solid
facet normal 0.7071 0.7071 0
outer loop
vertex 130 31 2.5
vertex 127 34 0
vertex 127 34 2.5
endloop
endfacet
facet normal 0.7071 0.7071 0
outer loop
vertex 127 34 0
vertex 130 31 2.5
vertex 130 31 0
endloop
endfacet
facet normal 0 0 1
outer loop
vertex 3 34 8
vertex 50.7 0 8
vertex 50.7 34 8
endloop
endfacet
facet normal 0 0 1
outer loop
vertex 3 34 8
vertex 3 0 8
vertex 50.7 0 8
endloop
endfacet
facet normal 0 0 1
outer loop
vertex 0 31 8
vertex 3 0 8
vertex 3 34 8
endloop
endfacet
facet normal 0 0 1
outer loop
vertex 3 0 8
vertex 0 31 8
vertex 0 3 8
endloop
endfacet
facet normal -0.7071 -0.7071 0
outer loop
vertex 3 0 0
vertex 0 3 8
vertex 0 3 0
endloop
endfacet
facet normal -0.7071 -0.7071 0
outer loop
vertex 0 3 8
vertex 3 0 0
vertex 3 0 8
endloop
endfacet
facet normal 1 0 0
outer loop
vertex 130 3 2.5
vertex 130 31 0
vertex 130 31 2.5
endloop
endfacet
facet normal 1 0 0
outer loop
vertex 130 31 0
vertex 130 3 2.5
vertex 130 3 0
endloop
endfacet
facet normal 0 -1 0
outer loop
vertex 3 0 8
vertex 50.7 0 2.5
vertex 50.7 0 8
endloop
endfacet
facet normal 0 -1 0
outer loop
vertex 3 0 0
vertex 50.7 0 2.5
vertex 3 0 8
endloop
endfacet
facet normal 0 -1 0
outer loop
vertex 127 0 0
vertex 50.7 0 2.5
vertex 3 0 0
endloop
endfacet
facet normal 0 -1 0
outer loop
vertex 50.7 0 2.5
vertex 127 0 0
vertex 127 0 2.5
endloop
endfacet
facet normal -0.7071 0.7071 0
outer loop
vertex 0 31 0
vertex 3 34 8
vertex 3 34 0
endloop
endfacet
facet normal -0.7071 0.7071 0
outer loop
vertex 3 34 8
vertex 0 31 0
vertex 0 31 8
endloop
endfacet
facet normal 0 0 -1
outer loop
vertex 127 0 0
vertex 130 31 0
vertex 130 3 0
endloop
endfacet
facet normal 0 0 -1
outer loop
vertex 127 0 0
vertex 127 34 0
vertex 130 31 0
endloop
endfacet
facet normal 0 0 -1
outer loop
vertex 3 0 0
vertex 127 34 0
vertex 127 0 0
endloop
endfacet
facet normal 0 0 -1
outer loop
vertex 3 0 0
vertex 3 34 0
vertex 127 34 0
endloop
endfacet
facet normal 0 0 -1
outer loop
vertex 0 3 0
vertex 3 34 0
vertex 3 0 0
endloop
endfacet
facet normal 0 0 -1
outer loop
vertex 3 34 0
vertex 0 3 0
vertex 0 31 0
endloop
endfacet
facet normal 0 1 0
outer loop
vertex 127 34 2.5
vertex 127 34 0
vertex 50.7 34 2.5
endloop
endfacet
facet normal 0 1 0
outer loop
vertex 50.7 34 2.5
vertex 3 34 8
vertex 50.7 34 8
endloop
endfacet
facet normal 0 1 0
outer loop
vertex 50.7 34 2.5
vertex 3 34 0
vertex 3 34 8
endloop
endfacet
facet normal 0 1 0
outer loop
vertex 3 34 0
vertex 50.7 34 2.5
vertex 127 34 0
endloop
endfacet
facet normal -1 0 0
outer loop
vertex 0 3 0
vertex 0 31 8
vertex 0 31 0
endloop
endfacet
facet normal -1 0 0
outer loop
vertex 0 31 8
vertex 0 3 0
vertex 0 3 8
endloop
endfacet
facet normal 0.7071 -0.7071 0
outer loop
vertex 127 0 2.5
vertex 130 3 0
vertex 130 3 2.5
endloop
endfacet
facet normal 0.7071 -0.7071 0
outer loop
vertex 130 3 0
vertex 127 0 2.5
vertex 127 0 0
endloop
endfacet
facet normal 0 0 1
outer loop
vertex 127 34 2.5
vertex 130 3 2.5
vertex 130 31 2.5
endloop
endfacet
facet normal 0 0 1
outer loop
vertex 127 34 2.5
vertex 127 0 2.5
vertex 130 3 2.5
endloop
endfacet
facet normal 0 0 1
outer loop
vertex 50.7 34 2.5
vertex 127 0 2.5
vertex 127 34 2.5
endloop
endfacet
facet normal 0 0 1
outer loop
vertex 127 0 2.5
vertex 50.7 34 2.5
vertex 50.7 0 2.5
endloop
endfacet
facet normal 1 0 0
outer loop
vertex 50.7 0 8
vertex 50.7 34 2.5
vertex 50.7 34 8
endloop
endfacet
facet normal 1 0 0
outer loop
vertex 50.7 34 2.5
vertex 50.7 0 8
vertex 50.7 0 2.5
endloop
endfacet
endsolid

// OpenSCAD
$fn = 32;

// ----------------------------------------------------------------------
// Stepped bar: endstep, 130 x 34 x 8/2.5 mm
// ----------------------------------------------------------------------

// --- parameters (mm) ---
bar_l = 130;              // bar length, X
bar_w = 34;               // bar width, Y
plate_t = 8;              // thickness of the thick zone, Z
thin_t = 2.5;             // thickness of the thin zone
corner_c = 3;             // corner chamfer of the bar
step_cut = 5.5;           // material removed from the thin zone
step_x = 50.7;            // step position from the left end
depth_1 = 5.5;            // depth of cut 1 from the top face

profile = [[3, 0], [127, 0], [130, 3], [130, 31], [127, 34], [3, 34], [0, 31], [0, 3]];  // primary outline, 8 points, counter clockwise
void_1 = [[50.7, -1], [131, -1], [131, 35], [50.7, 35]];  // thin zone beyond the step, 4 points

// --- the one profile operation ---
difference() {
  linear_extrude(height = plate_t) polygon(points = profile);
  translate([0, 0, plate_t - depth_1])
    linear_extrude(height = depth_1 + 1) polygon(points = void_1);
}
